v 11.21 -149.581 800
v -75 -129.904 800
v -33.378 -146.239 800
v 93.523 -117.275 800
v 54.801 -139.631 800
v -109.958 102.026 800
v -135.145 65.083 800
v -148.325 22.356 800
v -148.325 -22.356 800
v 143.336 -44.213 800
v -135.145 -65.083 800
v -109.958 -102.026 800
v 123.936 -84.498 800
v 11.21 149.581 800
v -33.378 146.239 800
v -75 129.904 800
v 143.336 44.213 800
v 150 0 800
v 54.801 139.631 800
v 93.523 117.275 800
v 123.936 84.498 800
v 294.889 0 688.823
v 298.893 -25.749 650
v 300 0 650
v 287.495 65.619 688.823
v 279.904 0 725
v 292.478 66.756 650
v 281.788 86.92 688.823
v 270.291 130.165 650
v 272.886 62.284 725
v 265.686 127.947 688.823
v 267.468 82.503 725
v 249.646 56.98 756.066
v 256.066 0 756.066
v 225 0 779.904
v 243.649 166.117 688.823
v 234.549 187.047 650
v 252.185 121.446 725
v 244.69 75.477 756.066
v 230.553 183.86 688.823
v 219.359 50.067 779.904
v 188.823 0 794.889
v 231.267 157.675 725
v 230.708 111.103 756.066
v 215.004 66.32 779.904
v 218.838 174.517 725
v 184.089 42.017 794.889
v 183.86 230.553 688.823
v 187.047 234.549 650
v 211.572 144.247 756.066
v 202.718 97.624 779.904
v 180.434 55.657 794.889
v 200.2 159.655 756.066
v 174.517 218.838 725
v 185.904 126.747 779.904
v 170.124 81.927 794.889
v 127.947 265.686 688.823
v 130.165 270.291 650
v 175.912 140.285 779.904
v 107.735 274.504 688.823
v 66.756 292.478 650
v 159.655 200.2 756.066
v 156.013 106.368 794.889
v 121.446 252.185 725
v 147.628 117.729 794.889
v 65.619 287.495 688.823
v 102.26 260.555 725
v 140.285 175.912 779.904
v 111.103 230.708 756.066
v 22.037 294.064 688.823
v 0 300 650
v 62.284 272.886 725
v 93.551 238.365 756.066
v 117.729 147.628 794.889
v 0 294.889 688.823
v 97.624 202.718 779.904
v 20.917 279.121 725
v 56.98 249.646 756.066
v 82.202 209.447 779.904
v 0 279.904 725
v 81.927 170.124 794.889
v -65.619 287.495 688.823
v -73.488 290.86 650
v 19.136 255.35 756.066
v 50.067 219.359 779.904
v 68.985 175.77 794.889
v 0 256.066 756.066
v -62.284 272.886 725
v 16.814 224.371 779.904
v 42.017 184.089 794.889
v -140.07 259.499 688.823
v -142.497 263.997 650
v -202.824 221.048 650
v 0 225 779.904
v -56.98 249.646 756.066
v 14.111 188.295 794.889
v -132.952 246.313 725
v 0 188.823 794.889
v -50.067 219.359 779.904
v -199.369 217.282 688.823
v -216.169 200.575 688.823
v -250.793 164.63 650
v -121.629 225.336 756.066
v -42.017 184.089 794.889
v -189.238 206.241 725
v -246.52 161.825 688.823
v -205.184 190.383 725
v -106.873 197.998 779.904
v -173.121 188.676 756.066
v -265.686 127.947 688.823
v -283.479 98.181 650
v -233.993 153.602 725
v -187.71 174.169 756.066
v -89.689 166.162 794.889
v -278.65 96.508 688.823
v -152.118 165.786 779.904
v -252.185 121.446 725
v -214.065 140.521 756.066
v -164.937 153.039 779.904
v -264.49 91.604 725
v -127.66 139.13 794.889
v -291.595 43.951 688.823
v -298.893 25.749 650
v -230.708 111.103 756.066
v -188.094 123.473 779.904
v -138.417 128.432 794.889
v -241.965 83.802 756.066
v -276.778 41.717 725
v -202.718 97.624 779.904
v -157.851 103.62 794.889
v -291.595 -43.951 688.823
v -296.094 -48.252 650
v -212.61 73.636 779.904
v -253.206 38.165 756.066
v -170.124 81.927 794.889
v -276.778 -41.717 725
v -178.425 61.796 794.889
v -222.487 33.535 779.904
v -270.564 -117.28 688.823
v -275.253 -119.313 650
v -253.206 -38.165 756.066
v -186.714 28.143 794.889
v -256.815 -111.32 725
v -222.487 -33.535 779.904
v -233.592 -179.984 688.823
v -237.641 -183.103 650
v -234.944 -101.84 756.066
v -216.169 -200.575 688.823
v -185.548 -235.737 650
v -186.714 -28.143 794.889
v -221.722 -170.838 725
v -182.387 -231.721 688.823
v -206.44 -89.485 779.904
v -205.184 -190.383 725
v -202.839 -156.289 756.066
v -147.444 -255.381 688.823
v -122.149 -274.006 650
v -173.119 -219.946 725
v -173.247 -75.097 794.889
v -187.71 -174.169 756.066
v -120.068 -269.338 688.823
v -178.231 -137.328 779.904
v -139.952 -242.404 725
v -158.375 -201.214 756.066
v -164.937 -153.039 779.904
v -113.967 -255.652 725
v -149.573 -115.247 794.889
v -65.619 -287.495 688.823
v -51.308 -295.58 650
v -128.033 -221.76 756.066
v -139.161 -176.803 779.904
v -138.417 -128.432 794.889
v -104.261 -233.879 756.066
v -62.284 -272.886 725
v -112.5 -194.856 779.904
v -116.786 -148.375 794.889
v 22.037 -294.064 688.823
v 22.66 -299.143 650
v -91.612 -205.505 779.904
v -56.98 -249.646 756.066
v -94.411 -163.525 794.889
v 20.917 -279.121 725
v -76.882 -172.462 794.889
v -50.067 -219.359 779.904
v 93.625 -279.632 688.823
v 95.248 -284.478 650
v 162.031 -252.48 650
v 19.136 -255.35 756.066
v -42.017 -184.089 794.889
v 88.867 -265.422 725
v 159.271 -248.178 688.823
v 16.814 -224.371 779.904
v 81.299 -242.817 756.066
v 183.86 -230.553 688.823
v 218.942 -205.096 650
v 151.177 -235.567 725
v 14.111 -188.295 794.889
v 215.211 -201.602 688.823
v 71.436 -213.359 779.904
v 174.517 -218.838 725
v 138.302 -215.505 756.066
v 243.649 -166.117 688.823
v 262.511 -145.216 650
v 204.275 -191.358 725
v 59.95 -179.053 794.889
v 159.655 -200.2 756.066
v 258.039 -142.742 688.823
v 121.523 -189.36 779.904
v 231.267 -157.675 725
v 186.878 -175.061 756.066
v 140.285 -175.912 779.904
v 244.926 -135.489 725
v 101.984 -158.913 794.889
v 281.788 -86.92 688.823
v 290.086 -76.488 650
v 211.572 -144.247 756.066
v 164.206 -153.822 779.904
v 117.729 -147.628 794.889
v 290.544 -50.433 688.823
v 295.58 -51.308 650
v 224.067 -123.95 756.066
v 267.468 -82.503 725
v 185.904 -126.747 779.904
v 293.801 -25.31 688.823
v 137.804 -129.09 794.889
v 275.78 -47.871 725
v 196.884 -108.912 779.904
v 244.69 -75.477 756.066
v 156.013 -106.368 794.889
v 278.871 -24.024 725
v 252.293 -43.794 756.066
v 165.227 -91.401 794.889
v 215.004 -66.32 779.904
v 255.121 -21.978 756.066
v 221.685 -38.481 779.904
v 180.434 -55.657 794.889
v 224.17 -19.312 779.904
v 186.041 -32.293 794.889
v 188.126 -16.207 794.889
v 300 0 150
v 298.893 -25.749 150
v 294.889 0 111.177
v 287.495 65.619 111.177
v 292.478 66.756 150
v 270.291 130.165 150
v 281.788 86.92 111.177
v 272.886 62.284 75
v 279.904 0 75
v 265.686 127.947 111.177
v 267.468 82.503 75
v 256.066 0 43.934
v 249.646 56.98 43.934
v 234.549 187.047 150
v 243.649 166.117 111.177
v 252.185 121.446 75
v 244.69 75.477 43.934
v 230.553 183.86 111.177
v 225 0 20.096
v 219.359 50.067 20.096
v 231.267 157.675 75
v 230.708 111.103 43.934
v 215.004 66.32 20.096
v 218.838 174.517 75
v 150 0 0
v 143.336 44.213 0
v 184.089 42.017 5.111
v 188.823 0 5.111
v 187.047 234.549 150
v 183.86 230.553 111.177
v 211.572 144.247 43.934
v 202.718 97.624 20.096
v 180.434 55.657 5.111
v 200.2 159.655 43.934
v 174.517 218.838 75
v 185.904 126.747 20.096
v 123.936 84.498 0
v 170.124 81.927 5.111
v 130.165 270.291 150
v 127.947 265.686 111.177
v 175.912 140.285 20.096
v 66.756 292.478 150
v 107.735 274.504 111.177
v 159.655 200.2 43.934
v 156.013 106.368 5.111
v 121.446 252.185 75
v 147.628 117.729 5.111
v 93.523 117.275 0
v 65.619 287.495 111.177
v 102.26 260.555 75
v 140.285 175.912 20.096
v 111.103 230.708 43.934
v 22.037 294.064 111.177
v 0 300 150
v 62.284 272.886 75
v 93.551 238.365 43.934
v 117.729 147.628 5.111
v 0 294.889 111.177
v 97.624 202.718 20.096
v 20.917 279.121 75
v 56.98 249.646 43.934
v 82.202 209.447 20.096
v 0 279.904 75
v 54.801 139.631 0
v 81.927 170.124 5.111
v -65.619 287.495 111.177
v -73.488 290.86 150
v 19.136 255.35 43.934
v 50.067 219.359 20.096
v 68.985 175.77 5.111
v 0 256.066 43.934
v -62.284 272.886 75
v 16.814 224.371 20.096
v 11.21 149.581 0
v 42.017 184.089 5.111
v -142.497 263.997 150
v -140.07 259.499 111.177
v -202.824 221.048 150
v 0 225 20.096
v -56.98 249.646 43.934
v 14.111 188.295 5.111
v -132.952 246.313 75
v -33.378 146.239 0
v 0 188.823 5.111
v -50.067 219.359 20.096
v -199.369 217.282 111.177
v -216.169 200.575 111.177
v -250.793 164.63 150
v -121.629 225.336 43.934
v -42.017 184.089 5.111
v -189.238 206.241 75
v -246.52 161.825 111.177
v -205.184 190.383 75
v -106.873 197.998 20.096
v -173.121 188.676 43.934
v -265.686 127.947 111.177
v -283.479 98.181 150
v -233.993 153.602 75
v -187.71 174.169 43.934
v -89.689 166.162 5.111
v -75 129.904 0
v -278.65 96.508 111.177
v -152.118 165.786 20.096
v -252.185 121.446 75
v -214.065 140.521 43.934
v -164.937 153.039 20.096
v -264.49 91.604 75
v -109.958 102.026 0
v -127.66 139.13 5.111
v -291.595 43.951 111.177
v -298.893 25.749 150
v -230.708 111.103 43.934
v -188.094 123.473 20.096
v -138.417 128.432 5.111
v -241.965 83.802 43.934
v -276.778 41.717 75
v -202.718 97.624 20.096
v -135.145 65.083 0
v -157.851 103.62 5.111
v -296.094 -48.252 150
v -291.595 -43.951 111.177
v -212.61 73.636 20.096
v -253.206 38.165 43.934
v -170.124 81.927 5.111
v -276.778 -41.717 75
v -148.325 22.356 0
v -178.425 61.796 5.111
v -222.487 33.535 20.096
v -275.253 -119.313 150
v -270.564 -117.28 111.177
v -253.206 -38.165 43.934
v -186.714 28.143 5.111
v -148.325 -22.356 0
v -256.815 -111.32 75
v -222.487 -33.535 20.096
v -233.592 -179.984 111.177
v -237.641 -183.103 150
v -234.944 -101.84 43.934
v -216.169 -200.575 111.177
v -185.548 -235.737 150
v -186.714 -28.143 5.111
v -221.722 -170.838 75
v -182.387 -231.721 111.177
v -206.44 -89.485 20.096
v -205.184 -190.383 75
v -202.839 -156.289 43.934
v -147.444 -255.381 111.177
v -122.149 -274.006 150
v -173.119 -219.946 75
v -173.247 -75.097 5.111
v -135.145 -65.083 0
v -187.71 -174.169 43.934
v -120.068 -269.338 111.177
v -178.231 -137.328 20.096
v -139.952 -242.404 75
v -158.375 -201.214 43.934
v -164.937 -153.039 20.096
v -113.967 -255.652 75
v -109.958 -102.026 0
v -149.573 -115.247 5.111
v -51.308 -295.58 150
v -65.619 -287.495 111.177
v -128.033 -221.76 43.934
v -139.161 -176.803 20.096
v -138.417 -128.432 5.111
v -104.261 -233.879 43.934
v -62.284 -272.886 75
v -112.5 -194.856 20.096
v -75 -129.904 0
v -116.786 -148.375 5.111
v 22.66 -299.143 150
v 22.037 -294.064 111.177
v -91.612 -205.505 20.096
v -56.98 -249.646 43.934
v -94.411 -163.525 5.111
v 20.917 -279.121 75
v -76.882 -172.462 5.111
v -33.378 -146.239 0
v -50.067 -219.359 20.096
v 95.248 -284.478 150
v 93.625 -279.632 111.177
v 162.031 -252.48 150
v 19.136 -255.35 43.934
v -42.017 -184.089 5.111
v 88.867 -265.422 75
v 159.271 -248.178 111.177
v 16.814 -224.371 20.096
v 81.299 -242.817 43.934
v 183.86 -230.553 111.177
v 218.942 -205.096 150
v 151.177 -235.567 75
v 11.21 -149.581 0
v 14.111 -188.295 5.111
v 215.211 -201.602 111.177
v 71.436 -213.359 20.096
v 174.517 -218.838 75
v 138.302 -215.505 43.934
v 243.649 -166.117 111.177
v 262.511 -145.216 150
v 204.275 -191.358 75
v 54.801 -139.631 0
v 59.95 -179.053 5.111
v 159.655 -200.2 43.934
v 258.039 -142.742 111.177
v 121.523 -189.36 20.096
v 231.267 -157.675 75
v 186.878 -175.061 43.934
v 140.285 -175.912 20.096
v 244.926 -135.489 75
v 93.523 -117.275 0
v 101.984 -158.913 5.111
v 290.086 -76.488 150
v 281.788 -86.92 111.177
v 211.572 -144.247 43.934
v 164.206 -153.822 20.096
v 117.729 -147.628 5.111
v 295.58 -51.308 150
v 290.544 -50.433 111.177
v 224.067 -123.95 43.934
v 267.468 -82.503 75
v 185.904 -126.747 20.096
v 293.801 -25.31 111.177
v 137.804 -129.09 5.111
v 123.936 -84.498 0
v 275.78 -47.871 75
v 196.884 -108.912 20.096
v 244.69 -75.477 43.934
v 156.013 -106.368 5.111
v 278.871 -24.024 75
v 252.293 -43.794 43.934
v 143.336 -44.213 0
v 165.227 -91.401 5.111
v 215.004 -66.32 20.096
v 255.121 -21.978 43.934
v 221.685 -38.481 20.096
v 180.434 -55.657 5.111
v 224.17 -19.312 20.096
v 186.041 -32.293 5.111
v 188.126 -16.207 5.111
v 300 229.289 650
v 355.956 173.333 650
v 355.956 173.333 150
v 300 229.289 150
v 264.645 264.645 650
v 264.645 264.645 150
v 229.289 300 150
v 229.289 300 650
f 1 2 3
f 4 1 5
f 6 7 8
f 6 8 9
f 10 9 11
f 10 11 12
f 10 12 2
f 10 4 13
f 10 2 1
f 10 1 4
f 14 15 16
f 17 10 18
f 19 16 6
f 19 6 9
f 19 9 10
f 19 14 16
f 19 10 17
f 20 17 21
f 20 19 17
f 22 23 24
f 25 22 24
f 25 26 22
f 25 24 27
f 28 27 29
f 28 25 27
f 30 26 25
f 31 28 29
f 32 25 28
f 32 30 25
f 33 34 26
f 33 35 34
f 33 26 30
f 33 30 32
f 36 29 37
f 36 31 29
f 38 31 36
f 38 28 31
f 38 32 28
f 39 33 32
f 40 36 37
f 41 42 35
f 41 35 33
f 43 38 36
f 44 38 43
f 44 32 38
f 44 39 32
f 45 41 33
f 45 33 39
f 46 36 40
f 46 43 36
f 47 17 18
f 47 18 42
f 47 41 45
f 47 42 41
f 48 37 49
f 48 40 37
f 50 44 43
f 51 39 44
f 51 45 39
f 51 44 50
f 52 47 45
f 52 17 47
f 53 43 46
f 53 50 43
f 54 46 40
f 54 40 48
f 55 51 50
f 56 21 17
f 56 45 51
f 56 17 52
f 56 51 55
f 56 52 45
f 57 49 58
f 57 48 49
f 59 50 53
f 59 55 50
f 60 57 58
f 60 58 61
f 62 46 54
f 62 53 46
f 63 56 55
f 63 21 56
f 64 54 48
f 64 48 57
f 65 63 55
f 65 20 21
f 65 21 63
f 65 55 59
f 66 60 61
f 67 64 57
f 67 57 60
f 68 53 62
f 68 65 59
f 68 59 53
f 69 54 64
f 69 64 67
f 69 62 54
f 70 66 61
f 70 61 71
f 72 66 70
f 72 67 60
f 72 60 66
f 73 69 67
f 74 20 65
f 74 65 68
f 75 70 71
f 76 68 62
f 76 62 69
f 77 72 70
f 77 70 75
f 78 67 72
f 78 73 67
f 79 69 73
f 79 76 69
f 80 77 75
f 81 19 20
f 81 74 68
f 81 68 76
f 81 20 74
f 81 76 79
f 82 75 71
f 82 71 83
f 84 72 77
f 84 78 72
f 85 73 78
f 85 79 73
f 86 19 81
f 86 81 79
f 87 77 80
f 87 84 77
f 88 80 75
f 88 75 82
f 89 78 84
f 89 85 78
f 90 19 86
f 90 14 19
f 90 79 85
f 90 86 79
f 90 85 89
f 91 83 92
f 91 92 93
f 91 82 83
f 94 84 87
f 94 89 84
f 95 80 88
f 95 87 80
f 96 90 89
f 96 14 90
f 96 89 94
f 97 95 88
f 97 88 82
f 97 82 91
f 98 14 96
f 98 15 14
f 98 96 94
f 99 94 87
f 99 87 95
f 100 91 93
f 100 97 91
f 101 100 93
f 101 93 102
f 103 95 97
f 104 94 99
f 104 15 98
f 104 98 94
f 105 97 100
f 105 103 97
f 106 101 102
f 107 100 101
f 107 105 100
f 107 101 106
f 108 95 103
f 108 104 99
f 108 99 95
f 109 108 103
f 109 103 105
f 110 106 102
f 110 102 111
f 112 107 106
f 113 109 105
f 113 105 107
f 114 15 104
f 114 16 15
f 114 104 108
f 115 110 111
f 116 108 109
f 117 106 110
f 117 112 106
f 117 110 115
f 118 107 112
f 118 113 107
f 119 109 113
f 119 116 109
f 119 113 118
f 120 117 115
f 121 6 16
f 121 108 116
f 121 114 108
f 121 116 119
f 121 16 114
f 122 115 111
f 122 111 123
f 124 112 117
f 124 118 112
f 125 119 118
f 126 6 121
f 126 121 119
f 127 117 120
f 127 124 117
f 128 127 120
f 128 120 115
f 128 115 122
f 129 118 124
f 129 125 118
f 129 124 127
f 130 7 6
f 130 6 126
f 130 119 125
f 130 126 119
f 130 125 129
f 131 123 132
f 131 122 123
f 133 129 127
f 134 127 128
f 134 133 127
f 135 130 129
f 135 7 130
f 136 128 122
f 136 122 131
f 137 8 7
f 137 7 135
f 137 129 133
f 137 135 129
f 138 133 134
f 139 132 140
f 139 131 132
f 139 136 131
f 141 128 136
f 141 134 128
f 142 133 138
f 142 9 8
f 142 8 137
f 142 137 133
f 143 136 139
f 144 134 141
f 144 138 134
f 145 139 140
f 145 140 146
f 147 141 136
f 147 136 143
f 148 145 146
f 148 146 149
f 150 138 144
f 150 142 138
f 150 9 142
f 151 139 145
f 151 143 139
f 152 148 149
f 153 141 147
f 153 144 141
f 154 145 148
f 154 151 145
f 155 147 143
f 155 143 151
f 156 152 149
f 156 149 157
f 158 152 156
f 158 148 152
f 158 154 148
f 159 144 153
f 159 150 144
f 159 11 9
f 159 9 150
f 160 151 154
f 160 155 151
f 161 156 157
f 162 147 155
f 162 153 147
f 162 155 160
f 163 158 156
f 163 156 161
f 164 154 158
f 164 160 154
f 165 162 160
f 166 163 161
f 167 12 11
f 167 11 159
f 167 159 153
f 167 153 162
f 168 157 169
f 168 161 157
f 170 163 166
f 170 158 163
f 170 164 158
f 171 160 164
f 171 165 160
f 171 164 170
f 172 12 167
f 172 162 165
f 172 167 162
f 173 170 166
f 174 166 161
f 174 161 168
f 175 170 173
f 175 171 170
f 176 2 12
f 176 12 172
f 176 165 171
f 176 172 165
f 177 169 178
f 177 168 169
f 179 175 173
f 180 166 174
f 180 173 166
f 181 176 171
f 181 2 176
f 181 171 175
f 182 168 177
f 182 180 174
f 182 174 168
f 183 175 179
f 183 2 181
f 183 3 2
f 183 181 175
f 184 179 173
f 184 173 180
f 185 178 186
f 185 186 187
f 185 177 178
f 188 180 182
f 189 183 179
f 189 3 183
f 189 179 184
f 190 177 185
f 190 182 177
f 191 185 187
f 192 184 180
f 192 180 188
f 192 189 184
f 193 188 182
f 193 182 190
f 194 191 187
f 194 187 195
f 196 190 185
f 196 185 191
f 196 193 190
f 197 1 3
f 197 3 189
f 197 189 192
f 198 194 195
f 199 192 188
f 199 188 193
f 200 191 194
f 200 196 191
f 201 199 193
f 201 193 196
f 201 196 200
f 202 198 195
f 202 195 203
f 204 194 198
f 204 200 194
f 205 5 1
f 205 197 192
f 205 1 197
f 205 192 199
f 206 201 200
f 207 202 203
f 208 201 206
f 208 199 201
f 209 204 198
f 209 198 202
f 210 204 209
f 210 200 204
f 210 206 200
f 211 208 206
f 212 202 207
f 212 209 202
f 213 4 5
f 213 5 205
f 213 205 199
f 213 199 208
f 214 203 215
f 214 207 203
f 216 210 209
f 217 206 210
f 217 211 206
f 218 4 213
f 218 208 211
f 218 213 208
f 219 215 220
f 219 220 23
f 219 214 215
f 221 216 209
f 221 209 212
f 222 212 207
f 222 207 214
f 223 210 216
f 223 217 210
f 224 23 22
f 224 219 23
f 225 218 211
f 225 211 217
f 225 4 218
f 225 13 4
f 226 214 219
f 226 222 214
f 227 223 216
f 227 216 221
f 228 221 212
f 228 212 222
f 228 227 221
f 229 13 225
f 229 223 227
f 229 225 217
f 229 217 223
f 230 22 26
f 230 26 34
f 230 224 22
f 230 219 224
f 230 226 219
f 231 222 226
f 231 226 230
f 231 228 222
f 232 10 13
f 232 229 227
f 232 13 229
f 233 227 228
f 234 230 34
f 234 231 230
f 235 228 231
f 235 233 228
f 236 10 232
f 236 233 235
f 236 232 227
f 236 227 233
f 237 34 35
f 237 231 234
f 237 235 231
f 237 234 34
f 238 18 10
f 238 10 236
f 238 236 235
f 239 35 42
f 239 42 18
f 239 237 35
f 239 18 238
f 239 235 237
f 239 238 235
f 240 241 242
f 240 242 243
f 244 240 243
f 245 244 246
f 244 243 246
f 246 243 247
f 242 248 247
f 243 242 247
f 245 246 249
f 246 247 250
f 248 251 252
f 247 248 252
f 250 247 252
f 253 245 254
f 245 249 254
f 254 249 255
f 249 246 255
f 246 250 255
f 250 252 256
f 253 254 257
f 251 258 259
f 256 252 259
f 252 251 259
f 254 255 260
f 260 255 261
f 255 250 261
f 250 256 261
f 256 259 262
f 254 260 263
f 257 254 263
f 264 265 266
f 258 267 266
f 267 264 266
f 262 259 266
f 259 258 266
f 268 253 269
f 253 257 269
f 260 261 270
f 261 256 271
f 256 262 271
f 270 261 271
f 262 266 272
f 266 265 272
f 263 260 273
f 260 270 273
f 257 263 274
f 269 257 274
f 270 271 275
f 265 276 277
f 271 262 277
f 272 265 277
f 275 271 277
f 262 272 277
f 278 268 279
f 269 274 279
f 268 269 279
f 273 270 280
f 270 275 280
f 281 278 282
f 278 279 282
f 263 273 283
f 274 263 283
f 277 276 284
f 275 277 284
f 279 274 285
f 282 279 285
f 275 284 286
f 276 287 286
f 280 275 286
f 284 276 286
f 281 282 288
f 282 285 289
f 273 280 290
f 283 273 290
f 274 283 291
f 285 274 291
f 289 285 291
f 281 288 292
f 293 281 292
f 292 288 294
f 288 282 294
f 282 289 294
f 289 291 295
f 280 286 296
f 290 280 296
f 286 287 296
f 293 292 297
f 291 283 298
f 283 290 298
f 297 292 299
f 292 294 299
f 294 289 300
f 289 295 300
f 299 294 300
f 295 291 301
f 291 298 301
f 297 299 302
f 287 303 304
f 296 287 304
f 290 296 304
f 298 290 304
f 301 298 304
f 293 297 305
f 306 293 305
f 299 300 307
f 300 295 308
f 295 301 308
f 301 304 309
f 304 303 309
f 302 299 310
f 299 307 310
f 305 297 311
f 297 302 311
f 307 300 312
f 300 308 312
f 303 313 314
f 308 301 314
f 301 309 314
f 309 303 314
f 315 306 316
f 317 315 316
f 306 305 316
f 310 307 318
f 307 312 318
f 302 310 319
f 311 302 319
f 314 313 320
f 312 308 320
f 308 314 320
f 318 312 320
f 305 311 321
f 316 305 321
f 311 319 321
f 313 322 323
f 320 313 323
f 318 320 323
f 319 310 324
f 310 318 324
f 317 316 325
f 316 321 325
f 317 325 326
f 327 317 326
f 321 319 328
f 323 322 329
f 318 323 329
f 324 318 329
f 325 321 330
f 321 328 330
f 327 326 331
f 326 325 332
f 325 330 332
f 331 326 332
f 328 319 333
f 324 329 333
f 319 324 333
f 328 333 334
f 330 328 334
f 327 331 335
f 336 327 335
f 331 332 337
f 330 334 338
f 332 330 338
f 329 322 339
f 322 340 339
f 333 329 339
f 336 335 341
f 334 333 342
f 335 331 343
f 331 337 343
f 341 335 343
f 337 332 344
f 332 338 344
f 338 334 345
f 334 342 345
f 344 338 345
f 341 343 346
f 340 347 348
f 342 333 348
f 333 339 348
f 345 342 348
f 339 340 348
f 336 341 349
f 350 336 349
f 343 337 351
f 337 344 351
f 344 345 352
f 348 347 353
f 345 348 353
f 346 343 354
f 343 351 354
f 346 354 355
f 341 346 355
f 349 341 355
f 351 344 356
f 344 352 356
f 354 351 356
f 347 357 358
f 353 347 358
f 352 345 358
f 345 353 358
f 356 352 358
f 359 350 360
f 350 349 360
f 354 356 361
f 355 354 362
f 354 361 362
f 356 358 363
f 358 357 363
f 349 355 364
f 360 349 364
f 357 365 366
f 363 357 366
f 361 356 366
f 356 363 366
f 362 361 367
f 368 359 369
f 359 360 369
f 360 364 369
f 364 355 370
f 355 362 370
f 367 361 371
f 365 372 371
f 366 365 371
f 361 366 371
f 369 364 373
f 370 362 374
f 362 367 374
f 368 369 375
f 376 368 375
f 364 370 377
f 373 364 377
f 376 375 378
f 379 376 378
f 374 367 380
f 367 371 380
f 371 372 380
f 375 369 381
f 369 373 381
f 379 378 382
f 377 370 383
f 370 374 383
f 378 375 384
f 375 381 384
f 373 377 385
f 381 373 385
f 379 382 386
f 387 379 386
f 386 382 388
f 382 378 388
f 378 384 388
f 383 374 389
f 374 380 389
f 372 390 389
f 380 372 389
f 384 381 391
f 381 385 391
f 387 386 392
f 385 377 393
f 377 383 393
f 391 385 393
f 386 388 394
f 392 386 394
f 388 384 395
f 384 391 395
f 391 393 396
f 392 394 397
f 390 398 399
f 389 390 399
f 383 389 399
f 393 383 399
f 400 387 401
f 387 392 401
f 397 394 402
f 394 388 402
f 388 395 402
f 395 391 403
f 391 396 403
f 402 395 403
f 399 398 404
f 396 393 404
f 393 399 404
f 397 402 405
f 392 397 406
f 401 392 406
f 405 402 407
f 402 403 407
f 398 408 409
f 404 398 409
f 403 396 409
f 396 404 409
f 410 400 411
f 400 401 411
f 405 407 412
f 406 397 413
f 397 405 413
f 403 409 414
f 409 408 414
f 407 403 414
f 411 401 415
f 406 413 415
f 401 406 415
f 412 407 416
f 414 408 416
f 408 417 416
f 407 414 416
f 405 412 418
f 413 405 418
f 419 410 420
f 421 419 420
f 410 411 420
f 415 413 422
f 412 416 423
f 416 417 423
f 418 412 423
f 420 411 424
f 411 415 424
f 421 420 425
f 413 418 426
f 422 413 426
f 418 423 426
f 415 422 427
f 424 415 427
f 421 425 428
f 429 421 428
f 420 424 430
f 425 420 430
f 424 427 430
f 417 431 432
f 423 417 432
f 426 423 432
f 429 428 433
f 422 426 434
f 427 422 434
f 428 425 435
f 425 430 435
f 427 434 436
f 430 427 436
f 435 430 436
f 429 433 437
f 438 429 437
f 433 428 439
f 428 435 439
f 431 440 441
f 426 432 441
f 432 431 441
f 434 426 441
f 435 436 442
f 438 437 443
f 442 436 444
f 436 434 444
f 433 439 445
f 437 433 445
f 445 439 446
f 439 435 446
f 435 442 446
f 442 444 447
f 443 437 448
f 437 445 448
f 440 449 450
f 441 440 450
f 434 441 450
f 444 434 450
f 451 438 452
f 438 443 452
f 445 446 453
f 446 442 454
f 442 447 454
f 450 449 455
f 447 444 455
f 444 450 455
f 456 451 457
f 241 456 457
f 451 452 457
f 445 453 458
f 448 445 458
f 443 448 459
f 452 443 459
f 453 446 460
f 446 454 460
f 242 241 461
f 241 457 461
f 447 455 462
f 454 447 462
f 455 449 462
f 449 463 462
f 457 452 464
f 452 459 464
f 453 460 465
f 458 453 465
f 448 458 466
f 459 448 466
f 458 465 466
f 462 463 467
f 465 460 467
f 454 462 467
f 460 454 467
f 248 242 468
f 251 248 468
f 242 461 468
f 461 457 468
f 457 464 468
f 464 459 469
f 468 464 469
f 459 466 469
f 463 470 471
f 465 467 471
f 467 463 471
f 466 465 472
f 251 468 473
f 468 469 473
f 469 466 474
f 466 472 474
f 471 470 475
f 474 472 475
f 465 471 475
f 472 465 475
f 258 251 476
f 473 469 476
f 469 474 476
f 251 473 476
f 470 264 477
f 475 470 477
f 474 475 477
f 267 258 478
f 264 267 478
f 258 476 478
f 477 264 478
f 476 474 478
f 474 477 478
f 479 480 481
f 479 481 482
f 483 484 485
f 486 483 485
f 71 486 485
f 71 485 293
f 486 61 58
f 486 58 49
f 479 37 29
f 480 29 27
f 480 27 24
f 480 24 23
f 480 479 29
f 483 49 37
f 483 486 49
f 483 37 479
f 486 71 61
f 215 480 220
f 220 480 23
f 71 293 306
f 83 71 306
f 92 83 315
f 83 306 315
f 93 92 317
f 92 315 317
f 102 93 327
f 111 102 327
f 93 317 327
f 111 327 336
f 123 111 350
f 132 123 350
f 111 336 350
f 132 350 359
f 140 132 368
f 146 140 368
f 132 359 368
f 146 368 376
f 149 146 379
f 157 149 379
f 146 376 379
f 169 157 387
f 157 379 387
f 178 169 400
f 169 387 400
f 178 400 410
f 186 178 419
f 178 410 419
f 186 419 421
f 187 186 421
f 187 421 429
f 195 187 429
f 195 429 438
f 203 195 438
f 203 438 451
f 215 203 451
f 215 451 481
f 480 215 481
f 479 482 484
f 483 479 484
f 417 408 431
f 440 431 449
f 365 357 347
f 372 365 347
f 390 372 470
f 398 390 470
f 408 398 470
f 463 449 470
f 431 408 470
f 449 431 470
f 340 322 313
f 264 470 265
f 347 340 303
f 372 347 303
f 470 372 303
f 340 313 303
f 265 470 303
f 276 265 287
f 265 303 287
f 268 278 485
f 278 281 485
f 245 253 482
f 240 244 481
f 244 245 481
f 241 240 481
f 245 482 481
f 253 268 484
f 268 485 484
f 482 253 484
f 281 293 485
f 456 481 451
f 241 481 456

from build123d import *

# Parameters (mm, degrees)
F0_R     = 300
F1_DEPTH = 800
F2_R     = 150
F4_START = -150
F4_DEPTH = 500


with BuildPart() as f1:
    # F0 (on Top) → F1 (new body)
    with BuildSketch(Plane.XY):
        Circle(F0_R)
    extrude(amount=F1_DEPTH)

    # F2
    f2_edges = [f1.edges().sort_by_distance(p)[0] for p in [
        (-300, 0, 800),
        (-300, 0, 0),
    ]]
    fillet(f2_edges, radius=F2_R)

    # F3 (on face) → F4 (join)
    with BuildSketch(Plane.XY.offset(800).offset(F4_START)):
        with BuildLine():
            Line((229.2893218813, 300), (0, 300))
            ThreePointArc((0, 300), (114.8050297095, 277.1638597534), (212.132034356, 212.132034356))
            Line((212.132034356, 212.132034356), (264.6446609407, 264.6446609407))
            Line((264.6446609407, 264.6446609407), (229.2893218813, 300))
        make_face()
        with BuildLine():
            ThreePointArc((212.132034356, 212.132034356), (277.1638597534, 114.8050297095), (300, 0))
            Line((300, 0), (300, 229.2893218813))
            Line((300, 229.2893218813), (264.6446609407, 264.6446609407))
            Line((264.6446609407, 264.6446609407), (212.132034356, 212.132034356))
        make_face()
        with BuildLine():
            Line((300, 229.2893218813), (300, 0))
            ThreePointArc((300, 0), (297.5110648624, -38.5637949955), (290.0855581037, -76.4877047615))
            Line((290.0855581037, -76.4877047615), (355.9564720177, 173.3328498637))
            Line((355.9564720177, 173.3328498637), (300, 229.2893218813))
        make_face()
    extrude(amount=-F4_DEPTH)


solid = f1.part
